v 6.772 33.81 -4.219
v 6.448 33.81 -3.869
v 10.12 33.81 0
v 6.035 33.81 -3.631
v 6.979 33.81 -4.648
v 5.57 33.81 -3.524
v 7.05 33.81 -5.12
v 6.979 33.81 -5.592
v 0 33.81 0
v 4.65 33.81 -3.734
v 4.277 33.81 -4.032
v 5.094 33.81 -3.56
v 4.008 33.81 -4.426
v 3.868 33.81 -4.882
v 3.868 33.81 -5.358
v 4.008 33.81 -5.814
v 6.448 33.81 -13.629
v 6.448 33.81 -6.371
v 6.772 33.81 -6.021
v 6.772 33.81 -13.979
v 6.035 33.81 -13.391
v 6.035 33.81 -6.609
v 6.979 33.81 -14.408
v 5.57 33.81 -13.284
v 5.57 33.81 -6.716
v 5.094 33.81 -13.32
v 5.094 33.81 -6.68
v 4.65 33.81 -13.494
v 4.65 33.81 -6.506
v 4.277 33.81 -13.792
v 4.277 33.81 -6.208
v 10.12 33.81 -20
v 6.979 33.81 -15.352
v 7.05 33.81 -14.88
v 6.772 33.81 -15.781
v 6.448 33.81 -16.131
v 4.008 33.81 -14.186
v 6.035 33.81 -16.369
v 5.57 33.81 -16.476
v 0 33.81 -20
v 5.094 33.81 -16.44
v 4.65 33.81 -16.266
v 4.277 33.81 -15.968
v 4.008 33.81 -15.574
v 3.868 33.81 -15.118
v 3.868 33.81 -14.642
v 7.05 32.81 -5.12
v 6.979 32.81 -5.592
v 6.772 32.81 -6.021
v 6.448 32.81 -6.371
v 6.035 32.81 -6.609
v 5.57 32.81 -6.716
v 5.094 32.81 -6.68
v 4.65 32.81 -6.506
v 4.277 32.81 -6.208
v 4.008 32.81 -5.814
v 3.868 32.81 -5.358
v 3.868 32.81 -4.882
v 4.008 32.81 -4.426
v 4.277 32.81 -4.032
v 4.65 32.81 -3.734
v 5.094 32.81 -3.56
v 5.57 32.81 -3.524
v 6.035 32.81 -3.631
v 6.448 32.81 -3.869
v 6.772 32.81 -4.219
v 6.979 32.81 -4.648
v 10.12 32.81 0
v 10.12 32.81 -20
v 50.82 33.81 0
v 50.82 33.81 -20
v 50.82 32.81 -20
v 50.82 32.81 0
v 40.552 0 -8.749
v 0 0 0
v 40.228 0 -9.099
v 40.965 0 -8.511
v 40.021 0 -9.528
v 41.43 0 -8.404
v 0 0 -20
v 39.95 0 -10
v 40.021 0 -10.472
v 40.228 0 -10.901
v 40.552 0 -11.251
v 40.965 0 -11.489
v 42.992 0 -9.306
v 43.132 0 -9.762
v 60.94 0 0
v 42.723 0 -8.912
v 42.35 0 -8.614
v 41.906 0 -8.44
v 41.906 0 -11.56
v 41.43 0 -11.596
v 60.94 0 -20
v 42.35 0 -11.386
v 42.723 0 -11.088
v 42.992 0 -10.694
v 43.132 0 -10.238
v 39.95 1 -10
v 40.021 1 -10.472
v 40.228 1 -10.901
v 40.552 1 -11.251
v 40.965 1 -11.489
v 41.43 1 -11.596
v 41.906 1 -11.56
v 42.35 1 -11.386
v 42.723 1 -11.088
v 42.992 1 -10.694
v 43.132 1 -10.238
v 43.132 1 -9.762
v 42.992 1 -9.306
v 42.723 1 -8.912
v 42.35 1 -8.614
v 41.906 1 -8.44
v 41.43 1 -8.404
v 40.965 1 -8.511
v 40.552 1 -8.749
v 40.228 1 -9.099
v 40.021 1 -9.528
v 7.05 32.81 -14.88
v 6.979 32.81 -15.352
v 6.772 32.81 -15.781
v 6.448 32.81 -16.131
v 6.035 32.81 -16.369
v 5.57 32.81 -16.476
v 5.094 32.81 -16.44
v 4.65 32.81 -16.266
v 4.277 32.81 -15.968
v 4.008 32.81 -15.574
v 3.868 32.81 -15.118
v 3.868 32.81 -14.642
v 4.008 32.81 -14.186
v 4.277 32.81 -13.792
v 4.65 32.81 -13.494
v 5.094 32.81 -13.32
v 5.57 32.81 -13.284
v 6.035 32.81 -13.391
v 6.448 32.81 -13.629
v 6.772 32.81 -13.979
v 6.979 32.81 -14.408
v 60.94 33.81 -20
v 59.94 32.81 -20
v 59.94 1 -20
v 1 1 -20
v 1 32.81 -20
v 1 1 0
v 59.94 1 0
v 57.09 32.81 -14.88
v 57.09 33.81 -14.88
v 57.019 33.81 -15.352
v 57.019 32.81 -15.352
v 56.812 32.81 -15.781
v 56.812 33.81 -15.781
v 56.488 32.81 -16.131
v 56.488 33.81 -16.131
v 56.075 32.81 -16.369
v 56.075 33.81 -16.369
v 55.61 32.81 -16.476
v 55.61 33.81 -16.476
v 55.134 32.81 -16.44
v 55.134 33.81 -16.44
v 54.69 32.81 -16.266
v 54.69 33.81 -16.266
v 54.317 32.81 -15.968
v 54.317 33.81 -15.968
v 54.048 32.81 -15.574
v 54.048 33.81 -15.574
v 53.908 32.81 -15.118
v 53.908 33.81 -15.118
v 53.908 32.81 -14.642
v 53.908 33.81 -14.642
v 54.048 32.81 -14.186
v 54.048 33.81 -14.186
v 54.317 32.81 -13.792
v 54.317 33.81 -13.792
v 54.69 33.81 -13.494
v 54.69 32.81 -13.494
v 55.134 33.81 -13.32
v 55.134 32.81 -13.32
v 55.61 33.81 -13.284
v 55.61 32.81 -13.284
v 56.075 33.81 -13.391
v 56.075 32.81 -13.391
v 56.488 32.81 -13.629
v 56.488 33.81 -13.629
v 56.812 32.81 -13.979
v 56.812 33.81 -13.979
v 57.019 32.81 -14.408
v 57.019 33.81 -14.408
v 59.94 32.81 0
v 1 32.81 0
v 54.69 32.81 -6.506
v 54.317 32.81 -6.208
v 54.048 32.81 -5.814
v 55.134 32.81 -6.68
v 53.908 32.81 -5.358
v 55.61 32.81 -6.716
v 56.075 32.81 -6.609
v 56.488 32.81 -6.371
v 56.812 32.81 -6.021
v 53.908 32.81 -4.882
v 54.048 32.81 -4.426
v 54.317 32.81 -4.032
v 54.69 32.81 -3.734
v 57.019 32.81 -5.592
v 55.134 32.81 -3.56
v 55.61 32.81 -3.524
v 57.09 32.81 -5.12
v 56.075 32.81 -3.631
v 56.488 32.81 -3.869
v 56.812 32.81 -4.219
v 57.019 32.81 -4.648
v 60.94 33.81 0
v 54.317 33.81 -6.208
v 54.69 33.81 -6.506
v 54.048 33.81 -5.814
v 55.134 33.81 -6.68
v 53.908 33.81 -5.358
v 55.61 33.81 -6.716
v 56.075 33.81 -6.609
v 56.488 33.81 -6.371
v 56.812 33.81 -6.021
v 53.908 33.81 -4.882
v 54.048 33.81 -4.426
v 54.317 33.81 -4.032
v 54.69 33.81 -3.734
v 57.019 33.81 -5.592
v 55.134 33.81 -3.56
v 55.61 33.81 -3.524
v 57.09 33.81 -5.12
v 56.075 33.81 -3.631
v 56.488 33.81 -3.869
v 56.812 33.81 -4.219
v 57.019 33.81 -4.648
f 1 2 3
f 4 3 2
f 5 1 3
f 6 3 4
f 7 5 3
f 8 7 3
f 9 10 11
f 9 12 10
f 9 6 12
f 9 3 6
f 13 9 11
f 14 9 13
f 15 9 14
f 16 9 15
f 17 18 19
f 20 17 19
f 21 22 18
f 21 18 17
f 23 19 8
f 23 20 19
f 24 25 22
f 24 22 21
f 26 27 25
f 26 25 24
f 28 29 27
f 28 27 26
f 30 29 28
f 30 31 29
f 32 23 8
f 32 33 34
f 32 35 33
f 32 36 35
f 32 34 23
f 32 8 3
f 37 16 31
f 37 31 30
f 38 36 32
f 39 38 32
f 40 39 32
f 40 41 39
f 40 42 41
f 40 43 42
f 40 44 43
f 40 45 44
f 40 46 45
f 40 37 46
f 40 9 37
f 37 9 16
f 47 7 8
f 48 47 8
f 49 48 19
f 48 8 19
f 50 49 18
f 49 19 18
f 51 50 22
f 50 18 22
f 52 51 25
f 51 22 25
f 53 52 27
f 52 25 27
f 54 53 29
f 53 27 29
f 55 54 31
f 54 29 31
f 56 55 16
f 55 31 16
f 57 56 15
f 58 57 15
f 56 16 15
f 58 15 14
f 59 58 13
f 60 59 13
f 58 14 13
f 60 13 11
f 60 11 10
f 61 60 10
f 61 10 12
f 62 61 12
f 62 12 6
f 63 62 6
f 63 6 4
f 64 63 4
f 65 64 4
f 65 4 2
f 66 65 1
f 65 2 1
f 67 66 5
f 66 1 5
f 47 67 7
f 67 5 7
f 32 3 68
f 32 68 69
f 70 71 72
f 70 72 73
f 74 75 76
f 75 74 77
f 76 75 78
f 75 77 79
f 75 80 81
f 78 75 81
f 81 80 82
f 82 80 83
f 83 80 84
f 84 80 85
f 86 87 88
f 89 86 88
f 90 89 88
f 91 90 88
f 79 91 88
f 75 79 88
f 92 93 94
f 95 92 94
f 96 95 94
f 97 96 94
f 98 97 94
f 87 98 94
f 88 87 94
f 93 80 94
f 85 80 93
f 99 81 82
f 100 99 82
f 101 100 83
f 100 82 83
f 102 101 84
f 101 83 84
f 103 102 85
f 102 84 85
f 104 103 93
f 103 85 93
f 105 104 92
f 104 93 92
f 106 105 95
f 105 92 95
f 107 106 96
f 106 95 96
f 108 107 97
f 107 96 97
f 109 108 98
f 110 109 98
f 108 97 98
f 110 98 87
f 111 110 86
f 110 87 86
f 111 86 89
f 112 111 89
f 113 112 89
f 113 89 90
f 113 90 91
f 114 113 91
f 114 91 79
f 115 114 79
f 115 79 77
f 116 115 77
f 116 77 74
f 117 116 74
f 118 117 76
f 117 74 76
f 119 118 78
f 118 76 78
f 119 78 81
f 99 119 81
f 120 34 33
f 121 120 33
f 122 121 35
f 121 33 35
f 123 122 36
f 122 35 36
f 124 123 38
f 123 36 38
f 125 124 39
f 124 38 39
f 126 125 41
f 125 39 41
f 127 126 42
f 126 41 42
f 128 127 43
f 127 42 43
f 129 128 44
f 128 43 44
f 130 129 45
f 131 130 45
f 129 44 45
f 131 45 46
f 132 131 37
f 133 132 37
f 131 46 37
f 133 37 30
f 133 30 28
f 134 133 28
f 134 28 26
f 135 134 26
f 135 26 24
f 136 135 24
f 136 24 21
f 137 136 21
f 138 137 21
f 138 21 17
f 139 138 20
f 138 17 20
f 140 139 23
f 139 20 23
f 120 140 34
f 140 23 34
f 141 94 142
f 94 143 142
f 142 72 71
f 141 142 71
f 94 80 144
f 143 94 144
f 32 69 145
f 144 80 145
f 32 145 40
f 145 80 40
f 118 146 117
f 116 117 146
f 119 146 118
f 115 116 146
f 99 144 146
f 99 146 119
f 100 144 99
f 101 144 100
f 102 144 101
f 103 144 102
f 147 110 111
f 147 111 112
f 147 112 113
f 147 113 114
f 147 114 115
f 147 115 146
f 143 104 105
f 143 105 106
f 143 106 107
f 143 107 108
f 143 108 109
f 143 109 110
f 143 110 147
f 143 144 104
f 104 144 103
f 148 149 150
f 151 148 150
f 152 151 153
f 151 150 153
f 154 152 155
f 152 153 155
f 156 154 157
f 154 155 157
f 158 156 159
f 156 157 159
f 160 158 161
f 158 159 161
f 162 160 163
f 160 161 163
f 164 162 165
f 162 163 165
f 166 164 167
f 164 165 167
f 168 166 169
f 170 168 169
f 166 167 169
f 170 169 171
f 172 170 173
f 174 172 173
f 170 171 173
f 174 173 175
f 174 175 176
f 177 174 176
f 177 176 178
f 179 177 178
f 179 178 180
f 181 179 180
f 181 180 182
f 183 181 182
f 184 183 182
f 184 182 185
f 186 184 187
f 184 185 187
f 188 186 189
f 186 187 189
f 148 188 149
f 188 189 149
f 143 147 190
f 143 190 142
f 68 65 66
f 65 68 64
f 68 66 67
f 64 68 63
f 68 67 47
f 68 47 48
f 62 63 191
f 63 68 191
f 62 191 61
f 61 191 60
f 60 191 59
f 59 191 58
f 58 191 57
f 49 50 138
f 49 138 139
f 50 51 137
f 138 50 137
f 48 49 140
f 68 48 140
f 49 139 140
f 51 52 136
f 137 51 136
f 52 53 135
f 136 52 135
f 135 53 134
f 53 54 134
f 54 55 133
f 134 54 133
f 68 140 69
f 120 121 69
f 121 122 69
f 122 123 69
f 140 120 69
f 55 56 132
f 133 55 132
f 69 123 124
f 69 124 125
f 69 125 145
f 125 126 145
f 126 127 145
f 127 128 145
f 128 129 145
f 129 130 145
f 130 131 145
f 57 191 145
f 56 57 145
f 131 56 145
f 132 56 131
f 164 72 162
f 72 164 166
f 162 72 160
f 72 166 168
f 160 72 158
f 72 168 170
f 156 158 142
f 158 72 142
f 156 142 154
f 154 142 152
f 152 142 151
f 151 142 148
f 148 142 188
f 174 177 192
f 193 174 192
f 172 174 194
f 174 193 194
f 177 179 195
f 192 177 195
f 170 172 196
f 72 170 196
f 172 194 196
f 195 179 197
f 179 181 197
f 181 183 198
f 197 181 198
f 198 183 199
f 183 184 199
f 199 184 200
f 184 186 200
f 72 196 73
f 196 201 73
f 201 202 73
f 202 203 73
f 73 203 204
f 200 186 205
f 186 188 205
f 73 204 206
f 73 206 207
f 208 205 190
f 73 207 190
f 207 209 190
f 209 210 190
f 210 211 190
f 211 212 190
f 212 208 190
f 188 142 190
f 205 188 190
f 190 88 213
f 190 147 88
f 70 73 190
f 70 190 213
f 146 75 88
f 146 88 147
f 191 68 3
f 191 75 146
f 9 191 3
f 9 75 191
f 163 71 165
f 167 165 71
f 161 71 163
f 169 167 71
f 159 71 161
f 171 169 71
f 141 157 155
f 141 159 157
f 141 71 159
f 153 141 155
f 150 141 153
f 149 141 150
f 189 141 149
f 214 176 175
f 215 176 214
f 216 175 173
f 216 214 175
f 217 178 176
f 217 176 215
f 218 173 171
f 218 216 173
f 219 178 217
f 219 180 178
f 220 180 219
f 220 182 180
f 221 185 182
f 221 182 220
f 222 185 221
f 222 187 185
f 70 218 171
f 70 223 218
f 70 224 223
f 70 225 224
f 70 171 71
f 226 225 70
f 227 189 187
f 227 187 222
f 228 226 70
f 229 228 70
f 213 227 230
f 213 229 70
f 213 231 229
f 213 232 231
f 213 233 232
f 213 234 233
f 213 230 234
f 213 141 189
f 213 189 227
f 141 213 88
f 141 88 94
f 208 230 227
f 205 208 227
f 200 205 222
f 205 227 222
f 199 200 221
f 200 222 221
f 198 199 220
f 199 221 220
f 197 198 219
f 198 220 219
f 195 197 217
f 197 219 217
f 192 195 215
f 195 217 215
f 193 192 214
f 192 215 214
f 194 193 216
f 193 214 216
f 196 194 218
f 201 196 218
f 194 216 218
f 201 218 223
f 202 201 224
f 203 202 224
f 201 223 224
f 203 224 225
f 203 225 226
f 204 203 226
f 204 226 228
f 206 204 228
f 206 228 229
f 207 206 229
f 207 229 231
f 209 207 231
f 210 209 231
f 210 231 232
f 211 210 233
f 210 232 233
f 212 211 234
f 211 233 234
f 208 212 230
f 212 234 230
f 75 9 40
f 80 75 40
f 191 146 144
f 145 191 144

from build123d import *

# Parameters (mm, degrees)
SKETCH_2_W          = 60.94
SKETCH_2_H          = 20
EXTRUDE_1_DEPTH     = 1
SKETCH_3_W          = 1
SKETCH_3_H          = 20
EXTRUDE_2_DEPTH     = 32.81
SKETCH_4_W          = 1
SKETCH_4_H          = 20
EXTRUDE_3_DEPTH     = 32.81
SKETCH_9_W          = 20
SKETCH_9_H          = 1
EXTRUDE_8_DEPTH     = 9.12
SKETCH_10_W         = 20
SKETCH_10_H         = 1
EXTRUDE_9_DEPTH     = 9.12
SKETCH_13_R         = 1.6
CUT_EXTRUDE_2_DEPTH = 1
SKETCH_14_R         = 1.6
CUT_EXTRUDE_3_DEPTH = 1
SKETCH_15_R         = 1.6
CUT_EXTRUDE_4_DEPTH = 1
SKETCH_16_R         = 1.6
CUT_EXTRUDE_5_DEPTH = 1
SKETCH_17_R         = 1.6
CUT_EXTRUDE_6_DEPTH = 1


with BuildPart() as part:
    # ｽｹｯﾁ2 → ﾎﾞｽ - 押し出し1 (new body)
    with BuildSketch(Plane(origin=(0, 0, 0), x_dir=(1, 0, 0), z_dir=(0, 1, 0))):
        with Locations((30.47, 10)):
            Rectangle(SKETCH_2_W, SKETCH_2_H)
    extrude(amount=EXTRUDE_1_DEPTH)

    # ｽｹｯﾁ3 → ﾎﾞｽ - 押し出し2 (add)
    with BuildSketch(Plane(origin=(0, 1, 0), x_dir=(1, 0, 0), z_dir=(0, 1, 0))):
        with Locations((60.44, 10)):
            Rectangle(SKETCH_3_W, SKETCH_3_H)
    extrude(amount=EXTRUDE_2_DEPTH)

    # ｽｹｯﾁ4 → ﾎﾞｽ - 押し出し3 (add)
    with BuildSketch(Plane(origin=(0, 1, 0), x_dir=(1, 0, 0), z_dir=(0, 1, 0))):
        with Locations((0.5, 10)):
            Rectangle(SKETCH_4_W, SKETCH_4_H)
    extrude(amount=EXTRUDE_3_DEPTH)

    # ｽｹｯﾁ9 → ﾎﾞｽ - 押し出し8 (add)
    with BuildSketch(Plane.ZY.offset(-59.94)):
        with Locations((-10, 33.31)):
            Rectangle(SKETCH_9_W, SKETCH_9_H)
    extrude(amount=EXTRUDE_8_DEPTH)

    # ｽｹｯﾁ10 → ﾎﾞｽ - 押し出し9 (add)
    with BuildSketch(Plane(origin=(1, 0, 0), x_dir=(0, 0, -1), z_dir=(1, 0, 0))):
        with Locations((10, 33.31)):
            Rectangle(SKETCH_10_W, SKETCH_10_H)
    extrude(amount=EXTRUDE_9_DEPTH)

    # ｽｹｯﾁ13 → ｶｯﾄ - 押し出し2 (cut)
    with BuildSketch(Plane(origin=(0, 33.81, 0), x_dir=(1, 0, 0), z_dir=(0, 1, 0))):
        with Locations((55.49, 5.12)):
            Circle(SKETCH_13_R)
    extrude(amount=-CUT_EXTRUDE_2_DEPTH, mode=Mode.SUBTRACT)

    # ｽｹｯﾁ14 → ｶｯﾄ - 押し出し3 (cut)
    with BuildSketch(Plane(origin=(0, 33.81, 0), x_dir=(1, 0, 0), z_dir=(0, 1, 0))):
        with Locations((55.49, 14.88)):
            Circle(SKETCH_14_R)
    extrude(amount=-CUT_EXTRUDE_3_DEPTH, mode=Mode.SUBTRACT)

    # ｽｹｯﾁ15 → ｶｯﾄ - 押し出し4 (cut)
    with BuildSketch(Plane(origin=(0, 33.81, 0), x_dir=(1, 0, 0), z_dir=(0, 1, 0))):
        with Locations((5.45, 5.12)):
            Circle(SKETCH_15_R)
    extrude(amount=-CUT_EXTRUDE_4_DEPTH, mode=Mode.SUBTRACT)

    # ｽｹｯﾁ16 → ｶｯﾄ - 押し出し5 (cut)
    with BuildSketch(Plane(origin=(0, 33.81, 0), x_dir=(1, 0, 0), z_dir=(0, 1, 0))):
        with Locations((5.45, 14.88)):
            Circle(SKETCH_16_R)
    extrude(amount=-CUT_EXTRUDE_5_DEPTH, mode=Mode.SUBTRACT)

    # ｽｹｯﾁ17 → ｶｯﾄ - 押し出し6 (cut)
    with BuildSketch(Plane(origin=(0, 0, 0), x_dir=(-1, 0, 0), z_dir=(0, -1, 0))):
        with Locations((-41.55, 10)):
            Circle(SKETCH_17_R)
    extrude(amount=-CUT_EXTRUDE_6_DEPTH, mode=Mode.SUBTRACT)


solid = part.part
